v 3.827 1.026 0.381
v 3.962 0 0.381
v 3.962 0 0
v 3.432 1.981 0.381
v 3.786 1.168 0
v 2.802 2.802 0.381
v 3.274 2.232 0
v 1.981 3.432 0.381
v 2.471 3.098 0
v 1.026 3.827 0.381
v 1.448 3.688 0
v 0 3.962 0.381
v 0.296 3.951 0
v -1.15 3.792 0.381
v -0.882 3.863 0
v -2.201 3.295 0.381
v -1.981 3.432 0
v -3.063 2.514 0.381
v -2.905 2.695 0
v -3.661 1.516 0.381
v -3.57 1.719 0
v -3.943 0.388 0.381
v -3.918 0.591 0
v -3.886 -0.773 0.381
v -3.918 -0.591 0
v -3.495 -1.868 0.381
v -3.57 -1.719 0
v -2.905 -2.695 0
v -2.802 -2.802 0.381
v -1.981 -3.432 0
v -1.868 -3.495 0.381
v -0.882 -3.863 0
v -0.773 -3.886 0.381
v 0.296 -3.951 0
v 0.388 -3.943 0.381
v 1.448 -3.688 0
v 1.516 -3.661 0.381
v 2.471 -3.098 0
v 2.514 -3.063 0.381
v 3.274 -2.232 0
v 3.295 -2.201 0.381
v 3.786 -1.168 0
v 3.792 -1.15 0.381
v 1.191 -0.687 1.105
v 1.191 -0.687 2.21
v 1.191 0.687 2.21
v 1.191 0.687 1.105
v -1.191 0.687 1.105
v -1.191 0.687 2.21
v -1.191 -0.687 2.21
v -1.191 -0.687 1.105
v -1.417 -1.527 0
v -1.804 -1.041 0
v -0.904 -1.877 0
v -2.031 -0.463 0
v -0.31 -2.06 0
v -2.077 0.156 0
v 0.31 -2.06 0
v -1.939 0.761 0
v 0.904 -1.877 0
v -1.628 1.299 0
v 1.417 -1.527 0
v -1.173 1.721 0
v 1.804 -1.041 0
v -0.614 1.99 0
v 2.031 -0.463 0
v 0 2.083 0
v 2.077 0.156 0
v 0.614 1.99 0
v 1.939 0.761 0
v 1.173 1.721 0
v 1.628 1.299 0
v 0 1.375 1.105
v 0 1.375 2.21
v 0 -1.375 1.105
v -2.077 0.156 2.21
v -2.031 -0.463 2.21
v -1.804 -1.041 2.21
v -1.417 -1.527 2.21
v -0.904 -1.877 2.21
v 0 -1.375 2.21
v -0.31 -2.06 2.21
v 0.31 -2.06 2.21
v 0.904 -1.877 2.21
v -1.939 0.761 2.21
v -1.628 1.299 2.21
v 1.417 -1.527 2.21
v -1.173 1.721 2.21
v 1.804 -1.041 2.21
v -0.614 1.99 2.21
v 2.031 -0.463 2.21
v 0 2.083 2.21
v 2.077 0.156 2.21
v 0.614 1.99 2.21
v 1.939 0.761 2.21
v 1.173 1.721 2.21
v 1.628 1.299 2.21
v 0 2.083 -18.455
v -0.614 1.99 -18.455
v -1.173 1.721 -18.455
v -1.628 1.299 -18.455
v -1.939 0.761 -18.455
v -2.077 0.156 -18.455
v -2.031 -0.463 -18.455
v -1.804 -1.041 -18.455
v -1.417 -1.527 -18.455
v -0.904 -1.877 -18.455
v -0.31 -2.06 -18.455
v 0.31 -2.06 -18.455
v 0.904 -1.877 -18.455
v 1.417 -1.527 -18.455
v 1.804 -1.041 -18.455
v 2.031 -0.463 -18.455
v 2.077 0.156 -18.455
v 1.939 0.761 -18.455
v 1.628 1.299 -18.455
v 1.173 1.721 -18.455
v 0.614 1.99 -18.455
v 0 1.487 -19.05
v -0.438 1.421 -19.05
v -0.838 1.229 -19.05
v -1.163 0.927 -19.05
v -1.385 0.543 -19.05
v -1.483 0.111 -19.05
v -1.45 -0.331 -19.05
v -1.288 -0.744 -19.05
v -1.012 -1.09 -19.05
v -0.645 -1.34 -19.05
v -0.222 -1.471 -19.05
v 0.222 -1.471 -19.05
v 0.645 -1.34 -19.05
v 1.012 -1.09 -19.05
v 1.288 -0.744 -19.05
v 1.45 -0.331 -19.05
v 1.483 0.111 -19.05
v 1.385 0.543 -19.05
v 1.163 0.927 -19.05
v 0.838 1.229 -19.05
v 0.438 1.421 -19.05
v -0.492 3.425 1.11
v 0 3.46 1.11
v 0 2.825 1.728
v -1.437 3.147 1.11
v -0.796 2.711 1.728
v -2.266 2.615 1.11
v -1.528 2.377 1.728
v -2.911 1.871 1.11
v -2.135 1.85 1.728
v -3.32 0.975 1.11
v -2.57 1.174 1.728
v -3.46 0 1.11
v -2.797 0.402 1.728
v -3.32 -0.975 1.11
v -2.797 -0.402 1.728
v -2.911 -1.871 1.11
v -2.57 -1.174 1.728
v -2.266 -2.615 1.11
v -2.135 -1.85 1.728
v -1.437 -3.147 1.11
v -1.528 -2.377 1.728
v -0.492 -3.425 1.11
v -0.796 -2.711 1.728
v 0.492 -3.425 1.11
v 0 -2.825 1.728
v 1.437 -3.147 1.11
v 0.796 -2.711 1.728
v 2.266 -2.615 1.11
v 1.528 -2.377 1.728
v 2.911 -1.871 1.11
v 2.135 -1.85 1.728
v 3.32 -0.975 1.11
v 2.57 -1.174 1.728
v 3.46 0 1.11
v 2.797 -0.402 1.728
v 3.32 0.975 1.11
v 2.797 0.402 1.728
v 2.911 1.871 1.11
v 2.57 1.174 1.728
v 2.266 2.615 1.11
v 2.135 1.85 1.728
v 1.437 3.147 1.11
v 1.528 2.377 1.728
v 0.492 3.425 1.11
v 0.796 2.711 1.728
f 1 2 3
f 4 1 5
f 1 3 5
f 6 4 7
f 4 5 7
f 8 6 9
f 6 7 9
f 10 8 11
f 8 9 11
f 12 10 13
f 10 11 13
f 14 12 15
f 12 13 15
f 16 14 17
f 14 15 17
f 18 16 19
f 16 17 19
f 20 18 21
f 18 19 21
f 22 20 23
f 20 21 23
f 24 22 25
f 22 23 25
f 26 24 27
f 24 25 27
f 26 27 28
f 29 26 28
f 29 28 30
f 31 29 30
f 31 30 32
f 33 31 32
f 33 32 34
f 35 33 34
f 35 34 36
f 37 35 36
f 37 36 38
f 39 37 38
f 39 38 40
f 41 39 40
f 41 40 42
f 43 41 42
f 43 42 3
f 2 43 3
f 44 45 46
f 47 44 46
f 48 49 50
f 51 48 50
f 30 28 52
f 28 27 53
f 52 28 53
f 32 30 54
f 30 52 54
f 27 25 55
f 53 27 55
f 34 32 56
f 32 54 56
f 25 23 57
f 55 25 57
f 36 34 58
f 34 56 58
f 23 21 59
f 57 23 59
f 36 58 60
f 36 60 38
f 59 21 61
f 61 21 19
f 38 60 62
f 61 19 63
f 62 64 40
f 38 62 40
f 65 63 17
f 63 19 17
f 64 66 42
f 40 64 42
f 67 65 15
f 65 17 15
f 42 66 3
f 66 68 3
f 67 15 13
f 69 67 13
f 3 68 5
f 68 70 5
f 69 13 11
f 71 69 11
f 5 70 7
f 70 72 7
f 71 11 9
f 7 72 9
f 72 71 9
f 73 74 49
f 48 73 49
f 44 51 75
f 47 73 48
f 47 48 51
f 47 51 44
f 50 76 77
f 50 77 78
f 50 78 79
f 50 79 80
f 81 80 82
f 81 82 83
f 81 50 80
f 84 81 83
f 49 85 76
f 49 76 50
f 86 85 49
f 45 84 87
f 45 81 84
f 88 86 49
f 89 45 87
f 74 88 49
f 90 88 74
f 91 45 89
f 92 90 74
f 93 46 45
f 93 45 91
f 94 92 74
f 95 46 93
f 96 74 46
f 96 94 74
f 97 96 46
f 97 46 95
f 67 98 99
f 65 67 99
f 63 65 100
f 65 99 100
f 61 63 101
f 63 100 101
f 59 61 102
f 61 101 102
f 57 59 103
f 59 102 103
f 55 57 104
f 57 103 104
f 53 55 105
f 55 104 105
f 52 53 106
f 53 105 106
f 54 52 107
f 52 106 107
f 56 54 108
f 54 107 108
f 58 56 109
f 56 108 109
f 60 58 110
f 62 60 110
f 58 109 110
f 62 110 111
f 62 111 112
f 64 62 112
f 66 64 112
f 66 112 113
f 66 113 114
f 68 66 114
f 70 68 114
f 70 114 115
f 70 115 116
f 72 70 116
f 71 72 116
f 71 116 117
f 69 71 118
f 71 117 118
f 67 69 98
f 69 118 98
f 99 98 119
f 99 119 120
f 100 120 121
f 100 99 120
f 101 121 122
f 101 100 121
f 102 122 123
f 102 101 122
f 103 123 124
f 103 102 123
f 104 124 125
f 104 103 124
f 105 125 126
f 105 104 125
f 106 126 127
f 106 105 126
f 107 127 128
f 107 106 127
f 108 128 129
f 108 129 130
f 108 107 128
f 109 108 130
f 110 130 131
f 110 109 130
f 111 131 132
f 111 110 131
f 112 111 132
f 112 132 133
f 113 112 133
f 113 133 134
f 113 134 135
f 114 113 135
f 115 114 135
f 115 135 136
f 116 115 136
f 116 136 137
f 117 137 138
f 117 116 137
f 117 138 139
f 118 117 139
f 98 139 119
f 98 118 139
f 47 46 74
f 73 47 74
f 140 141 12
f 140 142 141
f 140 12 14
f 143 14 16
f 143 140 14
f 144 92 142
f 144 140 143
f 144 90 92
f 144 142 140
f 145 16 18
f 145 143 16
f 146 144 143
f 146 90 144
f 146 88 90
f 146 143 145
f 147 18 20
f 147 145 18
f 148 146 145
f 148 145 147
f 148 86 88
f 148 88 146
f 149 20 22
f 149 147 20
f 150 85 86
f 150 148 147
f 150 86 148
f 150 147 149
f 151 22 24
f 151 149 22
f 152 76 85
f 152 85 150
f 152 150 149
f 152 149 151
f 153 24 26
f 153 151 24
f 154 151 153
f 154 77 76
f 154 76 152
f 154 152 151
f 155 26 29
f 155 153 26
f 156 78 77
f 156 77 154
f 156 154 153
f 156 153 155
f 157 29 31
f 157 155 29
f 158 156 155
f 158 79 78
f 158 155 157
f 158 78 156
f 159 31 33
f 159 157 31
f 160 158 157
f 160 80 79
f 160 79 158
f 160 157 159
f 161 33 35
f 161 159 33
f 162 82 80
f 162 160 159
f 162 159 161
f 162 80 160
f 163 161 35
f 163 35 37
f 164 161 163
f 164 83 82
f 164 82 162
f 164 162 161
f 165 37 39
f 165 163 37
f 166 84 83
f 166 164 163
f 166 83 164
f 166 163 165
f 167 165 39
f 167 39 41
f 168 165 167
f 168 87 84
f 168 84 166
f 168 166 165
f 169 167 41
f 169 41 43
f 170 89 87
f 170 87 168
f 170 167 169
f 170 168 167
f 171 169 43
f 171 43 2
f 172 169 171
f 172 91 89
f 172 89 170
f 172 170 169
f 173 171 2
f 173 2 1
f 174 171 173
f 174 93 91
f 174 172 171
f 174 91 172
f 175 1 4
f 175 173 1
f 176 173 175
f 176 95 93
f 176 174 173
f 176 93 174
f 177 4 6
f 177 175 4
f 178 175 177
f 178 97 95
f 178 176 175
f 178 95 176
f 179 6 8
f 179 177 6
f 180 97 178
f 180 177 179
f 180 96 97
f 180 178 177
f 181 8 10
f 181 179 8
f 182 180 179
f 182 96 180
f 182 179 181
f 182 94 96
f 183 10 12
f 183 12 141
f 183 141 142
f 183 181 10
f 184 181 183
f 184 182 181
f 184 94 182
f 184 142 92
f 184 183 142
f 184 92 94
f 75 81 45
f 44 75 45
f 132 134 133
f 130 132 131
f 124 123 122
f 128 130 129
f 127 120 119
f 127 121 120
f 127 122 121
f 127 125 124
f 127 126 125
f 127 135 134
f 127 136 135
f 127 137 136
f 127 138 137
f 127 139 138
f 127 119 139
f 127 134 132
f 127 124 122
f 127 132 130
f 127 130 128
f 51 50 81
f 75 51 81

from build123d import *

# Parameters (mm, degrees)
SKETCH1_W          = 19.05
SKETCH1_H          = 2.0828
CHAMFER1_SIZE      = 0.5953125
SKETCH4_R          = 3.9624
EXTRUDE1_DEPTH     = 2.2098
CUT_EXTRUDE1_DEPTH = 1.1049


with BuildPart() as part:
    # Sketch1 → Revolve1 (revolve)
    with BuildSketch(Plane(origin=(0, 0, 0), x_dir=(0, 0, -1), z_dir=(1, 0, 0))):
        with Locations((9.525, 1.0414)):
            Rectangle(SKETCH1_W, SKETCH1_H)
    revolve(axis=Axis((0, 0, 0), (0, 0, 1)))

    # Chamfer1
    chamfer1_edges = [part.edges().sort_by_distance(p)[0] for p in [
        (0, -2.0828, -19.05),
    ]]
    chamfer(chamfer1_edges, length=CHAMFER1_SIZE)

    # Sketch4 → Extrude1 (add)
    with BuildSketch(Plane.XY):
        Circle(SKETCH4_R)
    extrude(amount=EXTRUDE1_DEPTH)

    # Sketch9 → Cut-Revolve3 (revolve, cut)
    with BuildSketch(Plane(origin=(0, 0, 0), x_dir=(0, 0, -1), z_dir=(1, 0, 0))):
        with BuildLine():
            Line((0, 3.9624), (-0.381, 3.9624))
            ThreePointArc((-0.381, 3.9624), (-1.434442989, 3.157885071), (-2.2098, 2.0828))
            Line((-2.2098, 2.0828), (-2.5908, 2.0828))
            Line((-2.5908, 2.0828), (-2.5908, 4.3434))
            Line((-2.5908, 4.3434), (0, 4.3434))
            Line((0, 4.3434), (0, 3.9624))
        make_face()
    revolve(axis=Axis((0, 0, 0), (0, 0, 1)), mode=Mode.SUBTRACT)

    # Sketch6 → Cut-Extrude1 (cut)
    with BuildSketch(Plane.XY.offset(2.2098)):
        Polygon((0, -1.374815329), (1.190625, -0.687407664), (1.190625, 0.687407664), (0, 1.374815329), (-1.190625, 0.687407664), (-1.190625, -0.687407664), align=None)
    extrude(amount=-CUT_EXTRUDE1_DEPTH, mode=Mode.SUBTRACT)


solid = part.part
